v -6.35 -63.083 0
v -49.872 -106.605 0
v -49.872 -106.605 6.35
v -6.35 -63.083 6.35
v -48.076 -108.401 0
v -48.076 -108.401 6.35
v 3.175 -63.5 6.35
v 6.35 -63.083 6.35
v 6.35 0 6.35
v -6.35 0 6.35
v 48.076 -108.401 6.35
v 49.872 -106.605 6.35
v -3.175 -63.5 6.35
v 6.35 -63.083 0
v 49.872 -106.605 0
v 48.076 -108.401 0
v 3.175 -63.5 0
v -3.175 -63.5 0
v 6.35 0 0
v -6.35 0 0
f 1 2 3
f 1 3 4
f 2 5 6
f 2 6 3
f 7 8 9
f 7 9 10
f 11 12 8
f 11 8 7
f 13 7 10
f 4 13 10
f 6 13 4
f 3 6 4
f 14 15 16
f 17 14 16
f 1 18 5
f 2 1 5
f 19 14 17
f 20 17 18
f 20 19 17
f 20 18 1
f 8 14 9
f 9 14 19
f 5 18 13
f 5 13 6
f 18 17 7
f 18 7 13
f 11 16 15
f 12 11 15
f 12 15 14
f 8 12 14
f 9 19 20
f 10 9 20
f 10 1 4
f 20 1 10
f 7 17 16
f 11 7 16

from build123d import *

# Parameters (mm, degrees)
F0_W     = 6.35
F0_H     = 63.5
F1_DEPTH = 6.35
F3_DEPTH = 6.35


# Not quite as in the source:
# - a feature names something its author has since deleted; it is built from what else it names


with BuildPart() as f1:
    # F0 (on Top) → F1 (new body)
    with BuildSketch(Plane.XY):
        with Locations((-3.175, -31.75)):
            Rectangle(F0_W, F0_H)
    extrude(amount=F1_DEPTH)

    # F2 (on face) → F3 (join)
    with BuildSketch(Plane(origin=(0, 0, 0), x_dir=(1, 0, 0), z_dir=(0, 0, -1))):
        Polygon((-4.9710512242, 61.7039487758), (-3.175, 63.5), (-48.0762806053, 108.4012806053), (-49.8723318296, 106.6052293811), align=None)
    extrude(amount=-F3_DEPTH)

    # F4: F1 across plane


with BuildPart() as f1_1:
    add(f1.part)
    add(f1.part.mirror(Plane.YZ))


solid = f1_1.part
